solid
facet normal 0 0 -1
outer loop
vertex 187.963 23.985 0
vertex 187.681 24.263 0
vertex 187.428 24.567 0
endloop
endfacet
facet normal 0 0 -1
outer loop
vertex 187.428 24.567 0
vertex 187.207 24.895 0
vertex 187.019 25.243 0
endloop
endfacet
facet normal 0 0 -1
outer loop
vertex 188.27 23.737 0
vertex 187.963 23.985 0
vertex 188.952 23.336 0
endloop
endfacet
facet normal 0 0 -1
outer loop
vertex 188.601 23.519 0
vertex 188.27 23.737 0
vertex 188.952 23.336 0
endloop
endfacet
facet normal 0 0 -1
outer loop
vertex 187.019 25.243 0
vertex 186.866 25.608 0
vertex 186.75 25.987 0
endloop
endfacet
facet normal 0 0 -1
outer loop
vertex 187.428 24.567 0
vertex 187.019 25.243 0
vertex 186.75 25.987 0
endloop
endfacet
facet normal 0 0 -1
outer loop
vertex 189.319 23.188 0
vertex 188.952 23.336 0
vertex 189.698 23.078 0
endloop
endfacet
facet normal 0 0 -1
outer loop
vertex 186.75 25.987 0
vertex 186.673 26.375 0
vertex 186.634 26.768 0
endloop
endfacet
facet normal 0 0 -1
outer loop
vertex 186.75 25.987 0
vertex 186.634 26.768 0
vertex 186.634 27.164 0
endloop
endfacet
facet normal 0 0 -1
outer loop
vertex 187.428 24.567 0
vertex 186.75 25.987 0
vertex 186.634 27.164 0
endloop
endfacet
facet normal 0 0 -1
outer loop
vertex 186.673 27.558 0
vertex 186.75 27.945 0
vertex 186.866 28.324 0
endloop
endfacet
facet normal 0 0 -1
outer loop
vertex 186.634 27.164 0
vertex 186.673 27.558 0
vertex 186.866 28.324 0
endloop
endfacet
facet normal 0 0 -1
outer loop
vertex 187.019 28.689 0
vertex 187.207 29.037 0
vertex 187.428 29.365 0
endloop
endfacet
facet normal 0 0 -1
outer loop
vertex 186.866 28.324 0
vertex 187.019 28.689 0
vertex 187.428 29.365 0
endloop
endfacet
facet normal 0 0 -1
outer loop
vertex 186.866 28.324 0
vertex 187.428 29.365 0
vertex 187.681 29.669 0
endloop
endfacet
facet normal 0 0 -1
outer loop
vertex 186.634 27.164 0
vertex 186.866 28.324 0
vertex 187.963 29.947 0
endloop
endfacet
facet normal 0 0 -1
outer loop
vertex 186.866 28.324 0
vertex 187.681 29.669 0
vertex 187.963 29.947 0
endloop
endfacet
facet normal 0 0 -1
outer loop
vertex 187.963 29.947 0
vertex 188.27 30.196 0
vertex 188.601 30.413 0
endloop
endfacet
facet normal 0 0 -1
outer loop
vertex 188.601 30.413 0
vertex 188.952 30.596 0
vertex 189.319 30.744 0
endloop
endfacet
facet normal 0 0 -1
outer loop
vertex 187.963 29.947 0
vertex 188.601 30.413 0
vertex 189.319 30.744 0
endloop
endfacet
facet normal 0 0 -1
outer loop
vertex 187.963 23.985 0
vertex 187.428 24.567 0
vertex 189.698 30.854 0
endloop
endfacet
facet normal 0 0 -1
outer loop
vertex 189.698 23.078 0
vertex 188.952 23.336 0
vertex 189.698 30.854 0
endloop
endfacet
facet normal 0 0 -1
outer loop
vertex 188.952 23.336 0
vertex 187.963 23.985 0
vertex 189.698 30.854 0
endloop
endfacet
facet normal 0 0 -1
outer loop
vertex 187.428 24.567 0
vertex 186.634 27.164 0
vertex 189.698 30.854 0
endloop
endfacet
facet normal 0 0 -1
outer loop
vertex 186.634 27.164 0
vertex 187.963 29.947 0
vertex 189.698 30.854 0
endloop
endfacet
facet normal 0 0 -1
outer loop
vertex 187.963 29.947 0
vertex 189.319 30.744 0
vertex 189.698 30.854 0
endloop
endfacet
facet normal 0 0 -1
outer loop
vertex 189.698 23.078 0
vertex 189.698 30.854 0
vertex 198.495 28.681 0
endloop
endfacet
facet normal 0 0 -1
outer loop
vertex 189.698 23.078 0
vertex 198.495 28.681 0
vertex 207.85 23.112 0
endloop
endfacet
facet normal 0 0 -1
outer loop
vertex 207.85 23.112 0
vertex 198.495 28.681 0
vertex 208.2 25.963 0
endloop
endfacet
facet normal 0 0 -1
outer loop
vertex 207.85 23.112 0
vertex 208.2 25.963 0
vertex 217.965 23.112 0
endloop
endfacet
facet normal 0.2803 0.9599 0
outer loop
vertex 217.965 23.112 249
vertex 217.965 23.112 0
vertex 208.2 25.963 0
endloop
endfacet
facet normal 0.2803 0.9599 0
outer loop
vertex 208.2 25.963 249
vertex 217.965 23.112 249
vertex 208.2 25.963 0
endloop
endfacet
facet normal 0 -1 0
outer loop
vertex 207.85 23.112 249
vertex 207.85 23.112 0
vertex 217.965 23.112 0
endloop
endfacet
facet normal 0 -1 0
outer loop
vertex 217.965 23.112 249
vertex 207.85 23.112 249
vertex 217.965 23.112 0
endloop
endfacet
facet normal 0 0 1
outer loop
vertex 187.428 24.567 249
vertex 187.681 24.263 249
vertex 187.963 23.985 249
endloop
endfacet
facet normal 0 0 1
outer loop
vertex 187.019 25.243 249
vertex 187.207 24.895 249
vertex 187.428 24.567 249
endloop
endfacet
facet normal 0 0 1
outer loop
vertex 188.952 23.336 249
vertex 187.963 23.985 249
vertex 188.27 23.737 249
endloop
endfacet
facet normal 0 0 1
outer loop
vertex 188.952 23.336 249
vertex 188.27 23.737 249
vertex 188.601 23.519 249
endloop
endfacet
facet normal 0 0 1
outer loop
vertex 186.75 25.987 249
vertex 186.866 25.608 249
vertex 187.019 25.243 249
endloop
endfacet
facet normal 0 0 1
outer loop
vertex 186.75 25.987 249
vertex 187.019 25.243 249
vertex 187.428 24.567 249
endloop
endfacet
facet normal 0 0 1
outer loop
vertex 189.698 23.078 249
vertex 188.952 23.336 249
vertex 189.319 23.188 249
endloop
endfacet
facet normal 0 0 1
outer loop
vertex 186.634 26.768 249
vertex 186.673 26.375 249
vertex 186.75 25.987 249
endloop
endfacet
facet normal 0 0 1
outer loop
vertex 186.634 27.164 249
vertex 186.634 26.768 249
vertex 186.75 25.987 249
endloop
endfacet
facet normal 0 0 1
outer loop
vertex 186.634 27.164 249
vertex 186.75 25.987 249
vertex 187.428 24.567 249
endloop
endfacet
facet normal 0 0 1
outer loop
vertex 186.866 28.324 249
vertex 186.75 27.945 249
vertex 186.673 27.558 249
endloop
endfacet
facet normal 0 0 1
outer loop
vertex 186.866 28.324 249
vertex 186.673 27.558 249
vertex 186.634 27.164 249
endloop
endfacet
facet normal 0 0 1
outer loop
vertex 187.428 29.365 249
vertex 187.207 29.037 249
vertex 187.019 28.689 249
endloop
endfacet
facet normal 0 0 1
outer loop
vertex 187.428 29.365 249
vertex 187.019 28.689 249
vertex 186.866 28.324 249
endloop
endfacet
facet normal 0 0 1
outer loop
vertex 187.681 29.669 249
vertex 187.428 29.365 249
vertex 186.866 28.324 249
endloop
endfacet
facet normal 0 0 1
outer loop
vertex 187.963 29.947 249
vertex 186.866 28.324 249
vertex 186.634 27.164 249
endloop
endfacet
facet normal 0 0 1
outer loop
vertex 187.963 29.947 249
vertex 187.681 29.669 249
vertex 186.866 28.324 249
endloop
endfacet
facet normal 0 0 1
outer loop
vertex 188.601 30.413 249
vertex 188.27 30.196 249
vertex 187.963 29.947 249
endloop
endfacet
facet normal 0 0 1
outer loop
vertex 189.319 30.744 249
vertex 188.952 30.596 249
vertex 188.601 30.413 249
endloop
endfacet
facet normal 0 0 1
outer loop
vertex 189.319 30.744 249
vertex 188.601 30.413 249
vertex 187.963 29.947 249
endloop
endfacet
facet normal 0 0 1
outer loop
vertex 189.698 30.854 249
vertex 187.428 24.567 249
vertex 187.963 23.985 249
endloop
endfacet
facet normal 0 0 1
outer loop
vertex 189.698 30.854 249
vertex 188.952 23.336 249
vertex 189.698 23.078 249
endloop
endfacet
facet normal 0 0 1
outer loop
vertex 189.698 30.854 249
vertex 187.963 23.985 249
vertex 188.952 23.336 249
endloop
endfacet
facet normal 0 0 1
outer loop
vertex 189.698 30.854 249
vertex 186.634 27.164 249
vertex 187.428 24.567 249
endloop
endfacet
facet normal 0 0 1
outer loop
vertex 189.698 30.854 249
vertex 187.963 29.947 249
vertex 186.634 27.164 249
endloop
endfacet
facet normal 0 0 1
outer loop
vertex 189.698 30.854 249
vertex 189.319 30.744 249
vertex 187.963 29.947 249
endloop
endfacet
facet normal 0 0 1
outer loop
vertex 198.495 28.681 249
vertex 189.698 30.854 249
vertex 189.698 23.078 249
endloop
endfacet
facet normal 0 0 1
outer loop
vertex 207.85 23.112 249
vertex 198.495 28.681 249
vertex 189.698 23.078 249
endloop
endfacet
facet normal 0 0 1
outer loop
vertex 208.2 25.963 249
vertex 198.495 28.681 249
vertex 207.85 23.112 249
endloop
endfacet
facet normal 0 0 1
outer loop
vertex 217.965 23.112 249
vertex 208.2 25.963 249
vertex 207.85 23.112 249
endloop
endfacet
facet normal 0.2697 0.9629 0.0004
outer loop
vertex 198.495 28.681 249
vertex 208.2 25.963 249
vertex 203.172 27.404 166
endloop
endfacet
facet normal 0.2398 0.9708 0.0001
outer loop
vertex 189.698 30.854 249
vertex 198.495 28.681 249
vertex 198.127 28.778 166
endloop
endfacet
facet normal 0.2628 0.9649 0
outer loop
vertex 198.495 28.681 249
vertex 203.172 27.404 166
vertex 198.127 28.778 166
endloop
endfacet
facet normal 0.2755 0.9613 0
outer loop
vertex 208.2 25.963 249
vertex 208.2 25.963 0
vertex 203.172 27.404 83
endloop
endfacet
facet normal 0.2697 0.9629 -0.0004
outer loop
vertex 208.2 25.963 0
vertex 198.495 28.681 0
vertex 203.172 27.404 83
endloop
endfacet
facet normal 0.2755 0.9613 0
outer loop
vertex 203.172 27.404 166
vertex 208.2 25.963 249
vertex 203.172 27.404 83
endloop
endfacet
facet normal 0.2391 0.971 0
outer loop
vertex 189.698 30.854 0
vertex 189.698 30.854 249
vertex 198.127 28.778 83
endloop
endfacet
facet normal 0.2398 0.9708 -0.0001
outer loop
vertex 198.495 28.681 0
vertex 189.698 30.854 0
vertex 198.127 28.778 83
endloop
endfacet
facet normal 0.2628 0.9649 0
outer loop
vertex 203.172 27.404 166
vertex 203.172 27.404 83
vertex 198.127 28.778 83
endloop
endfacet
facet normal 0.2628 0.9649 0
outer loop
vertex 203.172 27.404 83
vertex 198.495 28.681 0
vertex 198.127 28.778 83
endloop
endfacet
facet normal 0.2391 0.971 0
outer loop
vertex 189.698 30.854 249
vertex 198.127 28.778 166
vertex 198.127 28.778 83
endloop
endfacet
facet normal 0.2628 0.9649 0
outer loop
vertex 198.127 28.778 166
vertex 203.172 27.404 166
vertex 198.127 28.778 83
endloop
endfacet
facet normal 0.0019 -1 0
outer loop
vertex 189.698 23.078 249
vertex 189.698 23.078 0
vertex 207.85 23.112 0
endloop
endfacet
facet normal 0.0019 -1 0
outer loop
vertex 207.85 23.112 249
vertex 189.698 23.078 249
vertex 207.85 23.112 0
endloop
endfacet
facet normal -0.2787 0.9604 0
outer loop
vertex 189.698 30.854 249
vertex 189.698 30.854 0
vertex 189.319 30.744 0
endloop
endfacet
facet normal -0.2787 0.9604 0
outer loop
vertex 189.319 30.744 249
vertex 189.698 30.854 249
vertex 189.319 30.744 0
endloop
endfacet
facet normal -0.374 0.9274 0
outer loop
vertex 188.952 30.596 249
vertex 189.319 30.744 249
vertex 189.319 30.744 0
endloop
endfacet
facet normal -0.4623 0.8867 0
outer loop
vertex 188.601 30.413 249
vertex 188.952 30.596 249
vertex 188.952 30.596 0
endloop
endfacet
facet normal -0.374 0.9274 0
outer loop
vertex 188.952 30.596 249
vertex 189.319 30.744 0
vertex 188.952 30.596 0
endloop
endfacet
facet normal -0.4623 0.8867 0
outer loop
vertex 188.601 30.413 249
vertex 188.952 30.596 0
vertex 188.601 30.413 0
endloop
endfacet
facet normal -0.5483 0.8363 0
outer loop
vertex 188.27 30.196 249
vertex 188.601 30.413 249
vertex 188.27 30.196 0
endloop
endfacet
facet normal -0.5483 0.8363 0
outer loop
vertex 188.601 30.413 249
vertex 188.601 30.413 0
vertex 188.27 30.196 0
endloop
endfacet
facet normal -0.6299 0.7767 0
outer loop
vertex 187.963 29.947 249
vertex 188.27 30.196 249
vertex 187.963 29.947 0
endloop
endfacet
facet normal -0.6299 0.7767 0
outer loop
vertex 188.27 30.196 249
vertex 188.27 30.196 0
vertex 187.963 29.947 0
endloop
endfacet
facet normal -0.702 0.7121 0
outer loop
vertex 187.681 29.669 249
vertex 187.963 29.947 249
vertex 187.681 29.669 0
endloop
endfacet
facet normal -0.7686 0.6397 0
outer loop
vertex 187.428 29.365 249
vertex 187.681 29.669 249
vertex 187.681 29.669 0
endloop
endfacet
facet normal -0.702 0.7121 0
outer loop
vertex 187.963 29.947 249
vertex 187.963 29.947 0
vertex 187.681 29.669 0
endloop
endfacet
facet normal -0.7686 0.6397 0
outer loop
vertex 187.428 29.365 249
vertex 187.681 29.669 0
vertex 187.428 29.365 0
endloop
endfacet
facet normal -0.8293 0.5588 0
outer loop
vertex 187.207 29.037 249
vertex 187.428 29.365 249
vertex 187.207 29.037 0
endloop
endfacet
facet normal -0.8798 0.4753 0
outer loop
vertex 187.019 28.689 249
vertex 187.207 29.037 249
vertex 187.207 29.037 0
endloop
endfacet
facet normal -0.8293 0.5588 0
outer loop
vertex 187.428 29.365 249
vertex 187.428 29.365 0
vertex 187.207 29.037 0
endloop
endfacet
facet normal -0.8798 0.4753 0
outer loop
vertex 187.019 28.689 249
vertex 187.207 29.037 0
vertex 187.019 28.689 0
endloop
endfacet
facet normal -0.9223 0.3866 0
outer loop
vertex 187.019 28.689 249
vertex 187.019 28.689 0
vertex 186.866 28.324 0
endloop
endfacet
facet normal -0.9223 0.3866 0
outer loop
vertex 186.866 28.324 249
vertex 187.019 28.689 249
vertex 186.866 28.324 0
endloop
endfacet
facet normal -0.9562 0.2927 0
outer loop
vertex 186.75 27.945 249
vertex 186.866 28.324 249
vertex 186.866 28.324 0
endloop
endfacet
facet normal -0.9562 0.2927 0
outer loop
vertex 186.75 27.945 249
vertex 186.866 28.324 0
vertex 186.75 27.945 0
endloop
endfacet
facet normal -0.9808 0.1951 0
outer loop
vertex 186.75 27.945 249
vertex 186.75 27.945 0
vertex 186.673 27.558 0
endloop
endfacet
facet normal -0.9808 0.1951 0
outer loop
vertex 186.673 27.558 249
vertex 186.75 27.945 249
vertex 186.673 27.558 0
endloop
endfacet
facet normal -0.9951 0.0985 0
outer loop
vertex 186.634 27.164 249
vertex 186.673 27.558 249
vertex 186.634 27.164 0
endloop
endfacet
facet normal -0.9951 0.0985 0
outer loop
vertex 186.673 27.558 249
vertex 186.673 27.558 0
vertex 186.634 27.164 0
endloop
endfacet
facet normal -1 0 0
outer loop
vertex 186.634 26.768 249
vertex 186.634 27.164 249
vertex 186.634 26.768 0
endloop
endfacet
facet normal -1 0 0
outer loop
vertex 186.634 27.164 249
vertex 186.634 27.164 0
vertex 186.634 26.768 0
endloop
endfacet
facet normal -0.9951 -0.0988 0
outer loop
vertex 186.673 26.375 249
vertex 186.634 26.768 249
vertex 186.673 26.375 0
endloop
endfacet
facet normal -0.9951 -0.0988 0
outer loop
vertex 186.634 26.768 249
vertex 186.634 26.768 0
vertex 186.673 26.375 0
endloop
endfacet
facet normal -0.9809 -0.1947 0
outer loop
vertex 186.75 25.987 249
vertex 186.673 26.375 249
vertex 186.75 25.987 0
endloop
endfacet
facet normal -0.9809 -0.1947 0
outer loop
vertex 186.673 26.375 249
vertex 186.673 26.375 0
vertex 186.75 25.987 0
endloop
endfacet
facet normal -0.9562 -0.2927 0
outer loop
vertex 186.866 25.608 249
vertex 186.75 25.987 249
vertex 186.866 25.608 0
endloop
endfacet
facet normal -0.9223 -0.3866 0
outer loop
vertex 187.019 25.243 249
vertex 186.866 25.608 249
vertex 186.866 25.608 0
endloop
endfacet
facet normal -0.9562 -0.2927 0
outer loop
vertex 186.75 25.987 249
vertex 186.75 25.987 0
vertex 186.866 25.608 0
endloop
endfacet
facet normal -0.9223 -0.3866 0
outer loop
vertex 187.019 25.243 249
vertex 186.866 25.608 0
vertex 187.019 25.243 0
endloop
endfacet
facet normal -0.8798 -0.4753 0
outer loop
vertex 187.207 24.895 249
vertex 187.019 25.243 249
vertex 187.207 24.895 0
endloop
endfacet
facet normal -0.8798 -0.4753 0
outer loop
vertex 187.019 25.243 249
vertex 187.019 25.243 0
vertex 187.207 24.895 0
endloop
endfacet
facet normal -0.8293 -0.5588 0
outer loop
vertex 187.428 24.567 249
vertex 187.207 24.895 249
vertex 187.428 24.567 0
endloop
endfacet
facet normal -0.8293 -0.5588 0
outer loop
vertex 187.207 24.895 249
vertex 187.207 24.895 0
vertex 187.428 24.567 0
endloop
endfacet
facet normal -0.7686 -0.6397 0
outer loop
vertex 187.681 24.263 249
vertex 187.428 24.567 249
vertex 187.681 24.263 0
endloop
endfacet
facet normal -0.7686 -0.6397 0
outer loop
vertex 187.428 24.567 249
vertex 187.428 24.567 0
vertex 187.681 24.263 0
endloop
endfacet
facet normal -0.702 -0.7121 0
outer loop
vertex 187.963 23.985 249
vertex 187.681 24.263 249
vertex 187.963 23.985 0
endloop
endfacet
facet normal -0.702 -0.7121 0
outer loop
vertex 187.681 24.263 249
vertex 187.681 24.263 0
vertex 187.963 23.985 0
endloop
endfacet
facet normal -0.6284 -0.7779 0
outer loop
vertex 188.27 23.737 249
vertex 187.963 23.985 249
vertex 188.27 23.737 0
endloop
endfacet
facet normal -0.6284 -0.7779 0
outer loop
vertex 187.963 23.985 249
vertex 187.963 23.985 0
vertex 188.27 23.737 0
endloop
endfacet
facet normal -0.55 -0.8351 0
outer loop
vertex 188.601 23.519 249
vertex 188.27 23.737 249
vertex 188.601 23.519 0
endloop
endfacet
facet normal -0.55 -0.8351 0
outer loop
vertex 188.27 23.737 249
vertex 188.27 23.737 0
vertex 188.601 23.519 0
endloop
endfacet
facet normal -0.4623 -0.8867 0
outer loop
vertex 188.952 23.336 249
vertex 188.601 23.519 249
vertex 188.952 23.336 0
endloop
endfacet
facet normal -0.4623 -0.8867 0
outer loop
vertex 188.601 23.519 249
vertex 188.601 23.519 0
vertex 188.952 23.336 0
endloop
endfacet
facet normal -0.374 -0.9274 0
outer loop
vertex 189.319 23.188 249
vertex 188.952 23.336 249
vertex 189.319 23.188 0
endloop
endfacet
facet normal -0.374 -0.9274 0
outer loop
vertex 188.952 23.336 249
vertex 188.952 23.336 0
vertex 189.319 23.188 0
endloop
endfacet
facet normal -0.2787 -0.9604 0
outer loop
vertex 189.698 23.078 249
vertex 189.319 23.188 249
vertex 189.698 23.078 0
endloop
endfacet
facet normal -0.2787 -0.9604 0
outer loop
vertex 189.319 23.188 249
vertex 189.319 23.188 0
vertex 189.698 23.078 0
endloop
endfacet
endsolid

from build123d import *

# Parameters (mm, degrees)
BOSS_EXTRUDE1_DEPTH = 249


with BuildPart() as part:
    # Sketch1 → Boss-Extrude1 (new body)
    with BuildSketch(Plane.XY):
        with BuildLine():
            Line((189.698329187, 23.077647259), (207.849600842, 23.11245238))
            Line((207.849600842, 23.11245238), (217.965296171, 23.11245238))
            Line((217.965296171, 23.11245238), (208.199662873, 25.963149641))
            add(Edge.make_bspline(
                [(208.199662873, 25.963149641), (205.461210323, 26.762534479), (203.172469982, 27.404419223), (200.508776125, 28.151460912), (198.127071623, 28.777602141), (193.949594484, 29.875845298), (189.698329187, 30.854494337)],
                knots=[0, 0, 0, 0.25, 0.25, 0.5, 0.5, 0.915466563, 0.915466563, 0.915466563], degree=2))
            ThreePointArc((189.698329187, 30.854494337), (186.628644326, 26.966070798), (189.698329187, 23.077647259))
        make_face()
    extrude(amount=BOSS_EXTRUDE1_DEPTH)


solid = part.part
